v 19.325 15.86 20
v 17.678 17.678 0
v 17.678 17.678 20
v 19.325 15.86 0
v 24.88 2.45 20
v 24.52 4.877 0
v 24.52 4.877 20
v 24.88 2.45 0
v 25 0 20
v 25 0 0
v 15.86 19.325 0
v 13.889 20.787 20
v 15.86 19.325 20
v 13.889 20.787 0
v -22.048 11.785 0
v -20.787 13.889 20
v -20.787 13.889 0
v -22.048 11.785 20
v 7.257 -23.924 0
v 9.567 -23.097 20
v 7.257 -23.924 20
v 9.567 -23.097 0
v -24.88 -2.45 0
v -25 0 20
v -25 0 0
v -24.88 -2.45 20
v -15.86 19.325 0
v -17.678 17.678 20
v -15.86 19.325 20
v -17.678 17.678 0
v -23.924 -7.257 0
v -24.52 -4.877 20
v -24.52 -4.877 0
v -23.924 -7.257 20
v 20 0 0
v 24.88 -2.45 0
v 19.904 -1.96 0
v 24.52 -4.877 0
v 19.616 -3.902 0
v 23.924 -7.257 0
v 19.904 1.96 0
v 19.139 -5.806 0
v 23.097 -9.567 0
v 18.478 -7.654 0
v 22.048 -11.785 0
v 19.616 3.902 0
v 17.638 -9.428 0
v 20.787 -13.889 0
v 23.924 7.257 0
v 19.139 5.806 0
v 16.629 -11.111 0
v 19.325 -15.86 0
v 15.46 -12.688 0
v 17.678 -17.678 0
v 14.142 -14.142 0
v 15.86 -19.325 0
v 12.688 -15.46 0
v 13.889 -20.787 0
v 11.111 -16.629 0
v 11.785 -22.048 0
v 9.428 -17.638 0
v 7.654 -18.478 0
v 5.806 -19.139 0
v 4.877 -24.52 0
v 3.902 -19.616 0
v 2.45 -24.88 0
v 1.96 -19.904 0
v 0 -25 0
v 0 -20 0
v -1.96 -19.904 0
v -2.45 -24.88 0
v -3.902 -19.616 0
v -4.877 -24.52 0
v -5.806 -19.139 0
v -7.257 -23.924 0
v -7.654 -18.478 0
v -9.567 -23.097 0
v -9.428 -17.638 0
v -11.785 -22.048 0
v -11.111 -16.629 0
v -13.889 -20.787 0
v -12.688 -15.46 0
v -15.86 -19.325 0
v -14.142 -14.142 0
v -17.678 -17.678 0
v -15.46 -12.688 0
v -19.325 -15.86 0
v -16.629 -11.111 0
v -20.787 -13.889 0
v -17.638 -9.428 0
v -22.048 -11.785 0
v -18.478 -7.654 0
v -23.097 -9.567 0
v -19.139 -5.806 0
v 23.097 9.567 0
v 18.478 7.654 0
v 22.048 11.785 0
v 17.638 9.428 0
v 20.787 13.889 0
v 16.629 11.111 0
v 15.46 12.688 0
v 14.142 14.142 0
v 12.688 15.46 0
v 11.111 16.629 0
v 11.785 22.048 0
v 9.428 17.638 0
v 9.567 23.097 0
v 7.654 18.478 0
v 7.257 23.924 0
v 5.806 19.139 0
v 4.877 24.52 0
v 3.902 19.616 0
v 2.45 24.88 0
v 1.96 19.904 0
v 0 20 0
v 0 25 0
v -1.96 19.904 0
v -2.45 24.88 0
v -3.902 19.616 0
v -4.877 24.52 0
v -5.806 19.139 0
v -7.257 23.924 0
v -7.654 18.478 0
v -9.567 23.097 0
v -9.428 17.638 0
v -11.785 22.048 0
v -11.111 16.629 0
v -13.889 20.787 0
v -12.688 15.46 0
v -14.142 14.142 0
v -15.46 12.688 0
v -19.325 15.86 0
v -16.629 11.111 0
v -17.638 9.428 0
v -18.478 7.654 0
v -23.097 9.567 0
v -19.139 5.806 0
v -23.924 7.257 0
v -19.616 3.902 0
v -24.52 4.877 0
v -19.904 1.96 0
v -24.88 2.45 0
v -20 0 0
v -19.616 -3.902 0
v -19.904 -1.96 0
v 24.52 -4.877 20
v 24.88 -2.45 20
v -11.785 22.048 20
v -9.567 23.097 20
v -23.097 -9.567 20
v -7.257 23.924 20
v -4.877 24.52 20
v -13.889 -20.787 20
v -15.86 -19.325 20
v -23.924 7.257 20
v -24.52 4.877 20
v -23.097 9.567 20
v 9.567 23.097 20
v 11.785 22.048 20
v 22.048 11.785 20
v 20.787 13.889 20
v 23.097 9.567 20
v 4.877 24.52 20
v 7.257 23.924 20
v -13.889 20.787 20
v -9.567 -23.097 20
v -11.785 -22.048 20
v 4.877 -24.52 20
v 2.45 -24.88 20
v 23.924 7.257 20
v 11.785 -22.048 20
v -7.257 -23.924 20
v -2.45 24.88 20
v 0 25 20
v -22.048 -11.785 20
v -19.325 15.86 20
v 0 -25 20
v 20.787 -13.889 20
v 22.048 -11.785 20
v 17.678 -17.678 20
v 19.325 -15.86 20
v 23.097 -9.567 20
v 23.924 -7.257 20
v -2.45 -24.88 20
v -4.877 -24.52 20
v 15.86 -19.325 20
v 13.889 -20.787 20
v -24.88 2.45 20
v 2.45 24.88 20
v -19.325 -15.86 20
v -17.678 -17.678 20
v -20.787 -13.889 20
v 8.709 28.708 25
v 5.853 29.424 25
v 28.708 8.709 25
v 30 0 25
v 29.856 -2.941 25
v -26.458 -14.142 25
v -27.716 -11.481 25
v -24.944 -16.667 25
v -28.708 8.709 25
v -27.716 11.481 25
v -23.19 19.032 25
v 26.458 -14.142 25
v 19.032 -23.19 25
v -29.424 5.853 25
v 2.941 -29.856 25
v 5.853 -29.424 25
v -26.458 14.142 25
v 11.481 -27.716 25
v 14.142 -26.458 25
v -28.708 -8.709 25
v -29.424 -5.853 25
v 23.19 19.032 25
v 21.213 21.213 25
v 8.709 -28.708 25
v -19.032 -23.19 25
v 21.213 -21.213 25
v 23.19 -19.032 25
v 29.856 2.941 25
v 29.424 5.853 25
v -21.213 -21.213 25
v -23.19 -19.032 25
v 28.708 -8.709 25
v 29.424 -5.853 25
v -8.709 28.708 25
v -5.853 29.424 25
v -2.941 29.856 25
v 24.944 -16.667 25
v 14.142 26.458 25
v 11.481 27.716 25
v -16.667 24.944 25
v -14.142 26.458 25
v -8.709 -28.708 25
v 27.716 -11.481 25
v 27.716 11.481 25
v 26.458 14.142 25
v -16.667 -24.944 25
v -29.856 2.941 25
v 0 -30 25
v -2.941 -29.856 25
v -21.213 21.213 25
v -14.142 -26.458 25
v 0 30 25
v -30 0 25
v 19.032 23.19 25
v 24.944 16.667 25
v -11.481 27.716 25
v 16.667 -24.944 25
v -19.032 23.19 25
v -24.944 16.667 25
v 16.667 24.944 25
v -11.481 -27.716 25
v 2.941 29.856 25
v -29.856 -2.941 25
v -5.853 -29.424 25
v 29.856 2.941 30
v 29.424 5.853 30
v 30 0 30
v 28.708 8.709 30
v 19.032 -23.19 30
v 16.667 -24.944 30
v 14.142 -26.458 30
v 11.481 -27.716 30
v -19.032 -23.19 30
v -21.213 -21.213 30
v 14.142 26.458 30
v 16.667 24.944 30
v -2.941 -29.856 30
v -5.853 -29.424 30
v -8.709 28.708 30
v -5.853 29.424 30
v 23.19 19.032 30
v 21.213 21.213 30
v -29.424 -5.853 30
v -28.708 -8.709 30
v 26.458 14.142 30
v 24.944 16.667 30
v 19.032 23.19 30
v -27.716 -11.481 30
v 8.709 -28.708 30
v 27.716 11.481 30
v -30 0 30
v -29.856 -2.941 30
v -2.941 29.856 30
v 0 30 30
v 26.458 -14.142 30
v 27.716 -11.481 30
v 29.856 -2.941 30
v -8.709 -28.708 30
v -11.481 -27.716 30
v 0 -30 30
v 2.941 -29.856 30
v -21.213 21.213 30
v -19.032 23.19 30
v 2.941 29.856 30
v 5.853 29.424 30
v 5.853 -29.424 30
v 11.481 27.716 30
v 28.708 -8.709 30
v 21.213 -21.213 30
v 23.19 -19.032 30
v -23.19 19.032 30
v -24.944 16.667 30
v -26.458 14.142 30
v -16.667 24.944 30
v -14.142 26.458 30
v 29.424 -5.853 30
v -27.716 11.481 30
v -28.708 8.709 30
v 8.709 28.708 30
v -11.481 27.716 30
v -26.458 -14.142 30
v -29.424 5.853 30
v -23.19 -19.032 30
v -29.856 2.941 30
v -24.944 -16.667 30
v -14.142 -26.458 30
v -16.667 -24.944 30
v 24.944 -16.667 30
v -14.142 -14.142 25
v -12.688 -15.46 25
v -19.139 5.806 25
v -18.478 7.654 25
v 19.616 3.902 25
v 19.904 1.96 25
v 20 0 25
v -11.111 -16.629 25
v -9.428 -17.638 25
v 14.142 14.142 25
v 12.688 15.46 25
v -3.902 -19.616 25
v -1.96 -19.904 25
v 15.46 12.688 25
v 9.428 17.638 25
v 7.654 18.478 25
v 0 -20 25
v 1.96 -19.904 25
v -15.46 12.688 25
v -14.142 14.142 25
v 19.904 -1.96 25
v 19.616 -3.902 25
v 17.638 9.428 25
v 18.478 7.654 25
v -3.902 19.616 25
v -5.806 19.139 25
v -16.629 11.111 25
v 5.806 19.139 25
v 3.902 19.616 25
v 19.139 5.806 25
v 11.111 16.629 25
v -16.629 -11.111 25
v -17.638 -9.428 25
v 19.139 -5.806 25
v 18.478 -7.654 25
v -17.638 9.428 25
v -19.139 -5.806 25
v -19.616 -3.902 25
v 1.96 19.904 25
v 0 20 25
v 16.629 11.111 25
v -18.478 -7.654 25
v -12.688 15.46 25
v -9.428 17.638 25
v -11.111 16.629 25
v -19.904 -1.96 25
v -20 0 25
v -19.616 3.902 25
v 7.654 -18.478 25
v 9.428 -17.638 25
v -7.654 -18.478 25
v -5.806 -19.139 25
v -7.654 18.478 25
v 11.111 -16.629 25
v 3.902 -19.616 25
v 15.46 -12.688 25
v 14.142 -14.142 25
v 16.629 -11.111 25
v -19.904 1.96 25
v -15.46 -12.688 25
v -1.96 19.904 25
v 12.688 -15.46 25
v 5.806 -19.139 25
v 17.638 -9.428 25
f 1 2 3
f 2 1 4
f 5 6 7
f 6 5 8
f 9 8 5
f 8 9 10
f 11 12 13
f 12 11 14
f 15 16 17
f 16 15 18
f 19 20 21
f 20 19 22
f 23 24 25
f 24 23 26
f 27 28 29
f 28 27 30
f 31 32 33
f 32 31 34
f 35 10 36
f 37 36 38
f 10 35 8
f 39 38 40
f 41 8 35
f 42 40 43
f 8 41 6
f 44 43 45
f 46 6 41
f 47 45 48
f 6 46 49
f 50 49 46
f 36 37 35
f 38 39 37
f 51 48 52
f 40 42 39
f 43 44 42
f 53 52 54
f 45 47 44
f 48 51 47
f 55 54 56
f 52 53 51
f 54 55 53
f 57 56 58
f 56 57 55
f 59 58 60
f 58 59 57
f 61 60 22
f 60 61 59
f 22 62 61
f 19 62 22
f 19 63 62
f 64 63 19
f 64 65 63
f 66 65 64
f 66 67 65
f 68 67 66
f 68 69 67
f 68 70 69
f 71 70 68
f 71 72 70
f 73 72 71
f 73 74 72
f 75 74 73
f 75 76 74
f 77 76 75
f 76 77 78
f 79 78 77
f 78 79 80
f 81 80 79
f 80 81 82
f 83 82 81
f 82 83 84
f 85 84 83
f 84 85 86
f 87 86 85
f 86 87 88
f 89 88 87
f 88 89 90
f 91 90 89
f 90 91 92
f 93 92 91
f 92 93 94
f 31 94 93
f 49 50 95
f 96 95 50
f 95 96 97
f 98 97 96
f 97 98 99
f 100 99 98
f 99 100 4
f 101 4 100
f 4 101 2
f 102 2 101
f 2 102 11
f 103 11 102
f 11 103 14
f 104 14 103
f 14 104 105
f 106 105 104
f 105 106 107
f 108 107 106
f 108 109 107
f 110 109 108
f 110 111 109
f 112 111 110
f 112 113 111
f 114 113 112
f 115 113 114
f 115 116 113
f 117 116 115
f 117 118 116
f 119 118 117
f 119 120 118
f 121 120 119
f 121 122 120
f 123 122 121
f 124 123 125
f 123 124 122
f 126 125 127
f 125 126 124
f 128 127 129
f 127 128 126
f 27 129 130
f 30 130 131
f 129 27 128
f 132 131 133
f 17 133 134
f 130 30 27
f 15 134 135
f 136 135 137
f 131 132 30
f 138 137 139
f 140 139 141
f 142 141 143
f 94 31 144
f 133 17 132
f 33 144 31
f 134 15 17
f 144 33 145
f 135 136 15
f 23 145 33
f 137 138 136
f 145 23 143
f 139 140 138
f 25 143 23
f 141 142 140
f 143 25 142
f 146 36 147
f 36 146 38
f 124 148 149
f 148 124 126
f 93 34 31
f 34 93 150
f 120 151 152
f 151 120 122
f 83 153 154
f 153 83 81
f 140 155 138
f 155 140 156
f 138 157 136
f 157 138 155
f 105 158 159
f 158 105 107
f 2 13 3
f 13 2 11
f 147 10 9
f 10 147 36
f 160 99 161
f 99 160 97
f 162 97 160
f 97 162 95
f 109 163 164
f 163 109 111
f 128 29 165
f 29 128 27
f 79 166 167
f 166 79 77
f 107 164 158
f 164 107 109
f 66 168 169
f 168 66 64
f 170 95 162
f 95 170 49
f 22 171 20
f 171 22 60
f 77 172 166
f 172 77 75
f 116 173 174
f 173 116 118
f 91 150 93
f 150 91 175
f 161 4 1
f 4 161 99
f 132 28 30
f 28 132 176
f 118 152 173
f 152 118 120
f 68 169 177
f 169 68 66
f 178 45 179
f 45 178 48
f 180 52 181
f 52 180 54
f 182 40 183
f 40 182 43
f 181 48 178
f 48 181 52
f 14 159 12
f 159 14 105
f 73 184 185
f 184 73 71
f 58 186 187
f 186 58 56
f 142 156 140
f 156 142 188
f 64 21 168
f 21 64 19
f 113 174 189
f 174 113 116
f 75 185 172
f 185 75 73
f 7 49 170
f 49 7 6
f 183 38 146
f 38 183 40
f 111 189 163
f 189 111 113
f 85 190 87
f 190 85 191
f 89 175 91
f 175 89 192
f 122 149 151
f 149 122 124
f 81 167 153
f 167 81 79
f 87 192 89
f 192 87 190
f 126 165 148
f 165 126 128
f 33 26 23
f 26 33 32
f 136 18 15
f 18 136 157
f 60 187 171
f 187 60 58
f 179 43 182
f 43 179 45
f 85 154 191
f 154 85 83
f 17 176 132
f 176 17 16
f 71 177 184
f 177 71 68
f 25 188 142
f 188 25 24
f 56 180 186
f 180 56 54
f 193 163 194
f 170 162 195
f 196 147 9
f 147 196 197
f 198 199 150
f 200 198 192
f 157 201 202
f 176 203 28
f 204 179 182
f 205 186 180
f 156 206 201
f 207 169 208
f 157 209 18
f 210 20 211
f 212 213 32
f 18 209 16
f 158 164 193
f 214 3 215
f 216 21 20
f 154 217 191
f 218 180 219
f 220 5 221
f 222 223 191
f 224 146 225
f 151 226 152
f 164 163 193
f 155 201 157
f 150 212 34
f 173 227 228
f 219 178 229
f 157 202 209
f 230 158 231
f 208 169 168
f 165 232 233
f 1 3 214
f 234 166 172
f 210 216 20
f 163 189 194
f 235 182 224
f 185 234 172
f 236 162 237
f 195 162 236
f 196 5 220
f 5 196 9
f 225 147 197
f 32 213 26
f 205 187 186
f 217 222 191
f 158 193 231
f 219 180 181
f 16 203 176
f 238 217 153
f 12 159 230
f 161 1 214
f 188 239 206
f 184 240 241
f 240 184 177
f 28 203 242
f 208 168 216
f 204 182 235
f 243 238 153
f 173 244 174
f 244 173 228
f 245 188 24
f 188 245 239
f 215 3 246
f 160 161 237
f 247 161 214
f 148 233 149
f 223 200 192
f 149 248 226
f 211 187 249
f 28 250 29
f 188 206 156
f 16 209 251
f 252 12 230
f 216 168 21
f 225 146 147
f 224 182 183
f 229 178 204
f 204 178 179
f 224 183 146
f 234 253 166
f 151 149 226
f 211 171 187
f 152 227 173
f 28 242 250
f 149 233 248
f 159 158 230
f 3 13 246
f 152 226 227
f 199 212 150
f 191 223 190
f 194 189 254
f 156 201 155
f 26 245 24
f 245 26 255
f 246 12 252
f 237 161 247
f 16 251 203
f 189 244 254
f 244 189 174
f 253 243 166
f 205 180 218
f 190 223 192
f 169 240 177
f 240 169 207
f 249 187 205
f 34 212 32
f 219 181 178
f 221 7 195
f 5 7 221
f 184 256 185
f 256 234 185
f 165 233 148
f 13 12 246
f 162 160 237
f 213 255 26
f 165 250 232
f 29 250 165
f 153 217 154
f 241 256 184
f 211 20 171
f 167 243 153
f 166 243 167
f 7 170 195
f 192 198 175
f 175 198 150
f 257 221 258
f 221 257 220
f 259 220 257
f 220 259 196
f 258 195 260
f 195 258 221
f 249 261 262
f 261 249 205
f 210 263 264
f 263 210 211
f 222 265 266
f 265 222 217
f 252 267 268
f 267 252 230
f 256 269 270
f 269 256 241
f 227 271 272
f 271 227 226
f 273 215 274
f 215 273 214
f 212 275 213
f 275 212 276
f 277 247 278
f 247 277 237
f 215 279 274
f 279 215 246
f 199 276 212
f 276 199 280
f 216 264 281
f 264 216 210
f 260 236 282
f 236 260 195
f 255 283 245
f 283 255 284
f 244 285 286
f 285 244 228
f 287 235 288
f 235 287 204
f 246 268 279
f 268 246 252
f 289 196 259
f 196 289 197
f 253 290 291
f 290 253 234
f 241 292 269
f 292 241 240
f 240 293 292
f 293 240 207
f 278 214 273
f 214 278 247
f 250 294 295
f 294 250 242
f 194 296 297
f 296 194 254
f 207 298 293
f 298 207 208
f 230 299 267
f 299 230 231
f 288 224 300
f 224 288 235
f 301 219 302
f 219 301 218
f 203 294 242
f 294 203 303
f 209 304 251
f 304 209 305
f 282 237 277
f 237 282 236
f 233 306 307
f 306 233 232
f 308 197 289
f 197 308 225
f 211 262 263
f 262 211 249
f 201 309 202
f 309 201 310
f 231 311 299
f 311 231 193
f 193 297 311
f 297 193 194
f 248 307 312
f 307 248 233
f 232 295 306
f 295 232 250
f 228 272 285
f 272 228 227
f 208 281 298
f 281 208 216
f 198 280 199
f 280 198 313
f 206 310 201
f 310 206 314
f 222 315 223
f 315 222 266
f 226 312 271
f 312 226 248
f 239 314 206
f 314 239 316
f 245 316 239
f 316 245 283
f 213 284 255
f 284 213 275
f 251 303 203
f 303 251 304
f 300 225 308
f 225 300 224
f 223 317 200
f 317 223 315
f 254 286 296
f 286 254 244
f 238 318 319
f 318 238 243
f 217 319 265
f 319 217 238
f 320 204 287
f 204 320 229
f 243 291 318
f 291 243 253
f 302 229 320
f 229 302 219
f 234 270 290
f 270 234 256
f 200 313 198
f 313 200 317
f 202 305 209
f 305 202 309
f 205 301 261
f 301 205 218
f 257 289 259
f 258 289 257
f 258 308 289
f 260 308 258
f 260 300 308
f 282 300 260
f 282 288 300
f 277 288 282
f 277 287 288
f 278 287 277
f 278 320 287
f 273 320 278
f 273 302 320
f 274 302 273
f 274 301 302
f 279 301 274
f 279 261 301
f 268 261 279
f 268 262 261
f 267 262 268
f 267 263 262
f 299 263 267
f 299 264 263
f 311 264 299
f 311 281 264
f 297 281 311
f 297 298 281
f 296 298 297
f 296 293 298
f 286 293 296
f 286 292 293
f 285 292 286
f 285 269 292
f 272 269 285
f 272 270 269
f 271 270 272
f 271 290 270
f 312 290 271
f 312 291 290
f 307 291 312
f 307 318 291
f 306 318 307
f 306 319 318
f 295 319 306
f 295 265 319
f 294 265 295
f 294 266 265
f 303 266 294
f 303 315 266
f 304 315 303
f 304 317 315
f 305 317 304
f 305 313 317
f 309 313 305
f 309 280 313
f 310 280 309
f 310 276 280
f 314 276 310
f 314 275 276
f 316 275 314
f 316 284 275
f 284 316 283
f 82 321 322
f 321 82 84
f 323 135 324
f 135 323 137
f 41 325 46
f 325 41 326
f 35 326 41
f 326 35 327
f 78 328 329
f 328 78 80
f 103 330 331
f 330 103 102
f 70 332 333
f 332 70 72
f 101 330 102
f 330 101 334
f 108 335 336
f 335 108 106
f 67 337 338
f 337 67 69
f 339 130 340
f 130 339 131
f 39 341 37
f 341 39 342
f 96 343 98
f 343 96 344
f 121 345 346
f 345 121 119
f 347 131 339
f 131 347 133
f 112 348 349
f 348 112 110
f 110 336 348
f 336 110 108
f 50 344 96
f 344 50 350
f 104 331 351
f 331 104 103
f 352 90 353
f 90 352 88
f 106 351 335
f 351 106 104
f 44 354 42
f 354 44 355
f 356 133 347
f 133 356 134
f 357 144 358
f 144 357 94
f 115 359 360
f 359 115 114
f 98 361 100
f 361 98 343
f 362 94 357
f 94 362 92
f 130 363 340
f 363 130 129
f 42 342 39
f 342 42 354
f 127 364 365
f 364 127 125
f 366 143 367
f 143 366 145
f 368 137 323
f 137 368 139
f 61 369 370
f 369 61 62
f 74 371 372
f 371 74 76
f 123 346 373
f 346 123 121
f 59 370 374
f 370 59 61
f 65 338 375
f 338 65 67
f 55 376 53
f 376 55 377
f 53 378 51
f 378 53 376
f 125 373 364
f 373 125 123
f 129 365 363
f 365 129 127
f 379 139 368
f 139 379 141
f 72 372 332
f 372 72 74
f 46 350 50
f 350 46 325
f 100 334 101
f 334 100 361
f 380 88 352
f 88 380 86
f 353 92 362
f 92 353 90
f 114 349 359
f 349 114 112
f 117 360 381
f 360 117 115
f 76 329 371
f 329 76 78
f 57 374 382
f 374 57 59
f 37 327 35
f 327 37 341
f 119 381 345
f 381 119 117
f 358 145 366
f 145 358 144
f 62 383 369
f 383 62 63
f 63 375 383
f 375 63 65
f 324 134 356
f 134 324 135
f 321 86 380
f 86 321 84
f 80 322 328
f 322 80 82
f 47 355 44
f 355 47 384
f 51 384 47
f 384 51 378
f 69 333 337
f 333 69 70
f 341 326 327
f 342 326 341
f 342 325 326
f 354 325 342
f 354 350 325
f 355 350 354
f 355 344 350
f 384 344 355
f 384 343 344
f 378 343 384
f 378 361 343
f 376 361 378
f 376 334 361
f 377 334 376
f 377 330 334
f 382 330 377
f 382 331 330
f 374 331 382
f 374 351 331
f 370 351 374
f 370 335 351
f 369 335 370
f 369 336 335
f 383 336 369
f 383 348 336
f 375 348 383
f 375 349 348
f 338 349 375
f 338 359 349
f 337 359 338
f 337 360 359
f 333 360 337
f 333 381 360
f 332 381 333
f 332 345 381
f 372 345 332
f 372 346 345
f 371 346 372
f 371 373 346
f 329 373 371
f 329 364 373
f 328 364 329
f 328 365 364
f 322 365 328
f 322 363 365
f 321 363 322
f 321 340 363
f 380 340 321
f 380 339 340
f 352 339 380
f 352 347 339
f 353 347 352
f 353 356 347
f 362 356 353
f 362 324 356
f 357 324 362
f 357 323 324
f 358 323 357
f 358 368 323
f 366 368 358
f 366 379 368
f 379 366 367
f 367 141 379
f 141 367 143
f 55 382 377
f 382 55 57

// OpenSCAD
module ht_90_cap() {
    difference() {
        union() {
            cylinder(h=20, r1=25, r2=25, $fn=64);
            translate([0, 0, 20])
                cylinder(h=5, r1=25, r2=30, $fn=64);
            translate([0, 0, 25])
                cylinder(h=5, r1=30, r2=30, $fn=64);
        }
        translate([0, 0, -5])
            cylinder(h=30, r=20, $fn=64);
    }
}

ht_90_cap();
